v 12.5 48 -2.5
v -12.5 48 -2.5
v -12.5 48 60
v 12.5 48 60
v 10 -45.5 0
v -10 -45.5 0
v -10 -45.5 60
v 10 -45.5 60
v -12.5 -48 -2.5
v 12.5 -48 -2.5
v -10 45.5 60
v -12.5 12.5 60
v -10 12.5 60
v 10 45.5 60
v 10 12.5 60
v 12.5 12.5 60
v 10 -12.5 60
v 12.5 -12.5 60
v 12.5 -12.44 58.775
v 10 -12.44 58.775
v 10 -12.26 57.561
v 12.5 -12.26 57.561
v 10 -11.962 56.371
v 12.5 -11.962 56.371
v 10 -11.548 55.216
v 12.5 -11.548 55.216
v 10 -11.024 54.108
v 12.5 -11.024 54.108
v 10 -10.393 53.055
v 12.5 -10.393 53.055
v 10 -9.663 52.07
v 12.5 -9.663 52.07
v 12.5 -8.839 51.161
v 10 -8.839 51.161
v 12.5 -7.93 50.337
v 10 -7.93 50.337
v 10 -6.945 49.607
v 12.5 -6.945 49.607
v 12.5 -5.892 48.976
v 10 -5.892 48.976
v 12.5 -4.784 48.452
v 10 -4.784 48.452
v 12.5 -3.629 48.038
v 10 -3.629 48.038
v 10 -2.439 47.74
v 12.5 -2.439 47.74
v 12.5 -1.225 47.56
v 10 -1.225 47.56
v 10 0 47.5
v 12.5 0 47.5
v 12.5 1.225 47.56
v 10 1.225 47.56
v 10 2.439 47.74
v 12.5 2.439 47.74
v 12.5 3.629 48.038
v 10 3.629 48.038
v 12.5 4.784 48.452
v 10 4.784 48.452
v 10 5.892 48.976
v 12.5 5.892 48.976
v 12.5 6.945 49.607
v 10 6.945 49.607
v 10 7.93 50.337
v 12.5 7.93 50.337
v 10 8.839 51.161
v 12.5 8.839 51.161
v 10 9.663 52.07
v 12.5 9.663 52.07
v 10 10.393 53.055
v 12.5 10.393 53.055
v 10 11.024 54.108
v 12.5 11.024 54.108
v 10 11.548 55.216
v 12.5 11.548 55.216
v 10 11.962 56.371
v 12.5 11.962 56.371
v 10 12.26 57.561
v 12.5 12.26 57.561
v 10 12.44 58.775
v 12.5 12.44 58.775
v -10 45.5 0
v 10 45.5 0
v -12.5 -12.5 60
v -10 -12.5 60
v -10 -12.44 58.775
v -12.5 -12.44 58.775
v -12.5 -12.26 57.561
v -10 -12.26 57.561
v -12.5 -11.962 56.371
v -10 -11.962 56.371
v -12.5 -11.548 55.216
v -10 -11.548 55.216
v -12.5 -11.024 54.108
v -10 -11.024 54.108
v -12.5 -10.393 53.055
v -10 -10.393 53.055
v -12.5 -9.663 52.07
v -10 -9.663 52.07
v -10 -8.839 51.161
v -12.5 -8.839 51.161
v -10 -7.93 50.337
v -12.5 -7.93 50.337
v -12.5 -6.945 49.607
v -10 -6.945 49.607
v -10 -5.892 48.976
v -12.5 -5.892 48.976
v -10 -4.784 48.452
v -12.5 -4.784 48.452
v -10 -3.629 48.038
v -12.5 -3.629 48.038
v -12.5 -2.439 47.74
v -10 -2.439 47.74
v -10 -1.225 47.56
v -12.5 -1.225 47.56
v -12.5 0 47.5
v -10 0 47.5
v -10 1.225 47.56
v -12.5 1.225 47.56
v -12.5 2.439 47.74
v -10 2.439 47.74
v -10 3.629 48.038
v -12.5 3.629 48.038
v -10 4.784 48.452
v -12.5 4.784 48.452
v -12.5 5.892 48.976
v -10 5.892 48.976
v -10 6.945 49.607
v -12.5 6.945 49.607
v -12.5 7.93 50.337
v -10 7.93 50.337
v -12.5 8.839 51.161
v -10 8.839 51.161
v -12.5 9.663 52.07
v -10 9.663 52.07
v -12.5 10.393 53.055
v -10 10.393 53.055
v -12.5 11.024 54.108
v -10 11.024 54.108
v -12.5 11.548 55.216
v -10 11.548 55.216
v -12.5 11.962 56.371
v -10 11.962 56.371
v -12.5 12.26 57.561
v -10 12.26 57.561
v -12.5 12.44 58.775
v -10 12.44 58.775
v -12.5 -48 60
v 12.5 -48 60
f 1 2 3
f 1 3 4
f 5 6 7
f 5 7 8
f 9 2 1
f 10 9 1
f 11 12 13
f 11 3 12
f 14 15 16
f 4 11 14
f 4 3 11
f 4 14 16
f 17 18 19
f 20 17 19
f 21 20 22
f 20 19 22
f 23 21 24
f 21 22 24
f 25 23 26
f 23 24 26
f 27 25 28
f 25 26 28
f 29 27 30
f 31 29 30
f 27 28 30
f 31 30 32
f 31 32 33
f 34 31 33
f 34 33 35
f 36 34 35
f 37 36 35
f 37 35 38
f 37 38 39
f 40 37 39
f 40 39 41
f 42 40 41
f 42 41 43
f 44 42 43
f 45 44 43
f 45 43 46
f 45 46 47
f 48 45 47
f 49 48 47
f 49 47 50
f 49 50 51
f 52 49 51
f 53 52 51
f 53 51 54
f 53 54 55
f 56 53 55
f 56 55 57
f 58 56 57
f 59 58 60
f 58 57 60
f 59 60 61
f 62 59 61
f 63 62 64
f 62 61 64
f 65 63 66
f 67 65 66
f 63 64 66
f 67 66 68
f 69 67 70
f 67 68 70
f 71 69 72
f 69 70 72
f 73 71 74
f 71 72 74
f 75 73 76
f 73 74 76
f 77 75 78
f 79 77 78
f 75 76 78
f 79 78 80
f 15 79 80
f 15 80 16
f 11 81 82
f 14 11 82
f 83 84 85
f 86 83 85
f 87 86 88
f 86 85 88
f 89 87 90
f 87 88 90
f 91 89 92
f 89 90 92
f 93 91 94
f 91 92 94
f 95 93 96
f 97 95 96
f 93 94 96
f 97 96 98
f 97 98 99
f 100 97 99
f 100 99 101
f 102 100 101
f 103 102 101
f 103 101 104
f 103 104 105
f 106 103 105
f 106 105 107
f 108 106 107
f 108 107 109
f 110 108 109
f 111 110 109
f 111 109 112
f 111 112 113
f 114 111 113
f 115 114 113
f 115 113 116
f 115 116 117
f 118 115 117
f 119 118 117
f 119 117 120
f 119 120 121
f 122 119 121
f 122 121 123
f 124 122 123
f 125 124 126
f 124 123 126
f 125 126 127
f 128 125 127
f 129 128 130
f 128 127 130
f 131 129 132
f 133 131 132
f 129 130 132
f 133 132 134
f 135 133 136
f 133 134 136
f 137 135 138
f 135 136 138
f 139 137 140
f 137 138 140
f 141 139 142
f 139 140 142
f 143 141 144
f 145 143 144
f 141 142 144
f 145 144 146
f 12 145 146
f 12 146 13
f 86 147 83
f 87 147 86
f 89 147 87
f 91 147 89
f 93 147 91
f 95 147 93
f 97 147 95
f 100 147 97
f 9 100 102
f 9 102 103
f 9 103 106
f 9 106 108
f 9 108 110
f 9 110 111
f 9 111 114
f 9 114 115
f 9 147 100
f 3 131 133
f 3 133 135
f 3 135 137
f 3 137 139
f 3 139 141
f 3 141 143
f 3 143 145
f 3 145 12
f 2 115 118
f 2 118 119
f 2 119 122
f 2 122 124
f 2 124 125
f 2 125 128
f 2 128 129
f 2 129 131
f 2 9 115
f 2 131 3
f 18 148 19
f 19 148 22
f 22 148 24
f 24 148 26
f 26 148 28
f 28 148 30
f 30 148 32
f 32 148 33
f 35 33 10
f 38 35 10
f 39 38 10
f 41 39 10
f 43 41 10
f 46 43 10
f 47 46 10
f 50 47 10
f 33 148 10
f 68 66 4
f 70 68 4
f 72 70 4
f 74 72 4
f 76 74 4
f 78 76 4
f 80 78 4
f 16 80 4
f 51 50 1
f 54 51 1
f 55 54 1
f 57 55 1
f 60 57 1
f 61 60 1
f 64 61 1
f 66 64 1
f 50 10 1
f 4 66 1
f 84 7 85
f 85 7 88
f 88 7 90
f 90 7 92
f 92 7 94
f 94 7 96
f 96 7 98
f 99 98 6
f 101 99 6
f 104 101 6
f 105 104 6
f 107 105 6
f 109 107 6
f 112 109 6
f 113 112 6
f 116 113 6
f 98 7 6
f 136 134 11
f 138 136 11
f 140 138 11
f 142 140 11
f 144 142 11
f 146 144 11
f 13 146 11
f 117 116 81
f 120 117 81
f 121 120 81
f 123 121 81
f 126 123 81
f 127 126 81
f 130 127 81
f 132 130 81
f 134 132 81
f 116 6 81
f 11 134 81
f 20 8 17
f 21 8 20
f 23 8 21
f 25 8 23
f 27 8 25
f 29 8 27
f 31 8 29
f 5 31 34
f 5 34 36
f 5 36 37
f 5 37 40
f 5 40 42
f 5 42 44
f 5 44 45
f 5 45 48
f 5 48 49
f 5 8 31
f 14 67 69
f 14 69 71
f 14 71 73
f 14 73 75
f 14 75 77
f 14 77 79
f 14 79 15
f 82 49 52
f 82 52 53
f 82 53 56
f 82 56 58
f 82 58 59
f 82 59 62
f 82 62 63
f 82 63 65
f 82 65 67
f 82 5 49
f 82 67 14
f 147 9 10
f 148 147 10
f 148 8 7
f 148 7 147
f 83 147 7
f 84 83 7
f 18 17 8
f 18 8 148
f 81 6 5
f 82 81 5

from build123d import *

# Parameters (mm, degrees)
F0_W     = 20
F0_H     = 91
F1_DEPTH = 60
F2_T     = 2.5
F4_DEPTH = 25.001


with BuildPart() as f1:
    # F0 (on Top) → F1 (new body)
    with BuildSketch(Plane.XY):
        Rectangle(F0_W, F0_H)
    extrude(amount=F1_DEPTH)

    # F2
    f2_openings = [f1.faces().sort_by_distance(p)[0] for p in [
        (0, 0, 60),
    ]]
    offset(amount=F2_T, openings=f2_openings, kind=Kind.INTERSECTION)

    # F3 (on face) → F4 (cut, through all)
    with BuildSketch(Plane.YZ.offset(12.5)):
        with BuildLine():
            ThreePointArc((-12.5, 60), (0, 47.5), (12.5, 60))
            Line((12.5, 60), (-12.5, 60))
        make_face()
    extrude(amount=-F4_DEPTH, mode=Mode.SUBTRACT)


solid = f1.part
